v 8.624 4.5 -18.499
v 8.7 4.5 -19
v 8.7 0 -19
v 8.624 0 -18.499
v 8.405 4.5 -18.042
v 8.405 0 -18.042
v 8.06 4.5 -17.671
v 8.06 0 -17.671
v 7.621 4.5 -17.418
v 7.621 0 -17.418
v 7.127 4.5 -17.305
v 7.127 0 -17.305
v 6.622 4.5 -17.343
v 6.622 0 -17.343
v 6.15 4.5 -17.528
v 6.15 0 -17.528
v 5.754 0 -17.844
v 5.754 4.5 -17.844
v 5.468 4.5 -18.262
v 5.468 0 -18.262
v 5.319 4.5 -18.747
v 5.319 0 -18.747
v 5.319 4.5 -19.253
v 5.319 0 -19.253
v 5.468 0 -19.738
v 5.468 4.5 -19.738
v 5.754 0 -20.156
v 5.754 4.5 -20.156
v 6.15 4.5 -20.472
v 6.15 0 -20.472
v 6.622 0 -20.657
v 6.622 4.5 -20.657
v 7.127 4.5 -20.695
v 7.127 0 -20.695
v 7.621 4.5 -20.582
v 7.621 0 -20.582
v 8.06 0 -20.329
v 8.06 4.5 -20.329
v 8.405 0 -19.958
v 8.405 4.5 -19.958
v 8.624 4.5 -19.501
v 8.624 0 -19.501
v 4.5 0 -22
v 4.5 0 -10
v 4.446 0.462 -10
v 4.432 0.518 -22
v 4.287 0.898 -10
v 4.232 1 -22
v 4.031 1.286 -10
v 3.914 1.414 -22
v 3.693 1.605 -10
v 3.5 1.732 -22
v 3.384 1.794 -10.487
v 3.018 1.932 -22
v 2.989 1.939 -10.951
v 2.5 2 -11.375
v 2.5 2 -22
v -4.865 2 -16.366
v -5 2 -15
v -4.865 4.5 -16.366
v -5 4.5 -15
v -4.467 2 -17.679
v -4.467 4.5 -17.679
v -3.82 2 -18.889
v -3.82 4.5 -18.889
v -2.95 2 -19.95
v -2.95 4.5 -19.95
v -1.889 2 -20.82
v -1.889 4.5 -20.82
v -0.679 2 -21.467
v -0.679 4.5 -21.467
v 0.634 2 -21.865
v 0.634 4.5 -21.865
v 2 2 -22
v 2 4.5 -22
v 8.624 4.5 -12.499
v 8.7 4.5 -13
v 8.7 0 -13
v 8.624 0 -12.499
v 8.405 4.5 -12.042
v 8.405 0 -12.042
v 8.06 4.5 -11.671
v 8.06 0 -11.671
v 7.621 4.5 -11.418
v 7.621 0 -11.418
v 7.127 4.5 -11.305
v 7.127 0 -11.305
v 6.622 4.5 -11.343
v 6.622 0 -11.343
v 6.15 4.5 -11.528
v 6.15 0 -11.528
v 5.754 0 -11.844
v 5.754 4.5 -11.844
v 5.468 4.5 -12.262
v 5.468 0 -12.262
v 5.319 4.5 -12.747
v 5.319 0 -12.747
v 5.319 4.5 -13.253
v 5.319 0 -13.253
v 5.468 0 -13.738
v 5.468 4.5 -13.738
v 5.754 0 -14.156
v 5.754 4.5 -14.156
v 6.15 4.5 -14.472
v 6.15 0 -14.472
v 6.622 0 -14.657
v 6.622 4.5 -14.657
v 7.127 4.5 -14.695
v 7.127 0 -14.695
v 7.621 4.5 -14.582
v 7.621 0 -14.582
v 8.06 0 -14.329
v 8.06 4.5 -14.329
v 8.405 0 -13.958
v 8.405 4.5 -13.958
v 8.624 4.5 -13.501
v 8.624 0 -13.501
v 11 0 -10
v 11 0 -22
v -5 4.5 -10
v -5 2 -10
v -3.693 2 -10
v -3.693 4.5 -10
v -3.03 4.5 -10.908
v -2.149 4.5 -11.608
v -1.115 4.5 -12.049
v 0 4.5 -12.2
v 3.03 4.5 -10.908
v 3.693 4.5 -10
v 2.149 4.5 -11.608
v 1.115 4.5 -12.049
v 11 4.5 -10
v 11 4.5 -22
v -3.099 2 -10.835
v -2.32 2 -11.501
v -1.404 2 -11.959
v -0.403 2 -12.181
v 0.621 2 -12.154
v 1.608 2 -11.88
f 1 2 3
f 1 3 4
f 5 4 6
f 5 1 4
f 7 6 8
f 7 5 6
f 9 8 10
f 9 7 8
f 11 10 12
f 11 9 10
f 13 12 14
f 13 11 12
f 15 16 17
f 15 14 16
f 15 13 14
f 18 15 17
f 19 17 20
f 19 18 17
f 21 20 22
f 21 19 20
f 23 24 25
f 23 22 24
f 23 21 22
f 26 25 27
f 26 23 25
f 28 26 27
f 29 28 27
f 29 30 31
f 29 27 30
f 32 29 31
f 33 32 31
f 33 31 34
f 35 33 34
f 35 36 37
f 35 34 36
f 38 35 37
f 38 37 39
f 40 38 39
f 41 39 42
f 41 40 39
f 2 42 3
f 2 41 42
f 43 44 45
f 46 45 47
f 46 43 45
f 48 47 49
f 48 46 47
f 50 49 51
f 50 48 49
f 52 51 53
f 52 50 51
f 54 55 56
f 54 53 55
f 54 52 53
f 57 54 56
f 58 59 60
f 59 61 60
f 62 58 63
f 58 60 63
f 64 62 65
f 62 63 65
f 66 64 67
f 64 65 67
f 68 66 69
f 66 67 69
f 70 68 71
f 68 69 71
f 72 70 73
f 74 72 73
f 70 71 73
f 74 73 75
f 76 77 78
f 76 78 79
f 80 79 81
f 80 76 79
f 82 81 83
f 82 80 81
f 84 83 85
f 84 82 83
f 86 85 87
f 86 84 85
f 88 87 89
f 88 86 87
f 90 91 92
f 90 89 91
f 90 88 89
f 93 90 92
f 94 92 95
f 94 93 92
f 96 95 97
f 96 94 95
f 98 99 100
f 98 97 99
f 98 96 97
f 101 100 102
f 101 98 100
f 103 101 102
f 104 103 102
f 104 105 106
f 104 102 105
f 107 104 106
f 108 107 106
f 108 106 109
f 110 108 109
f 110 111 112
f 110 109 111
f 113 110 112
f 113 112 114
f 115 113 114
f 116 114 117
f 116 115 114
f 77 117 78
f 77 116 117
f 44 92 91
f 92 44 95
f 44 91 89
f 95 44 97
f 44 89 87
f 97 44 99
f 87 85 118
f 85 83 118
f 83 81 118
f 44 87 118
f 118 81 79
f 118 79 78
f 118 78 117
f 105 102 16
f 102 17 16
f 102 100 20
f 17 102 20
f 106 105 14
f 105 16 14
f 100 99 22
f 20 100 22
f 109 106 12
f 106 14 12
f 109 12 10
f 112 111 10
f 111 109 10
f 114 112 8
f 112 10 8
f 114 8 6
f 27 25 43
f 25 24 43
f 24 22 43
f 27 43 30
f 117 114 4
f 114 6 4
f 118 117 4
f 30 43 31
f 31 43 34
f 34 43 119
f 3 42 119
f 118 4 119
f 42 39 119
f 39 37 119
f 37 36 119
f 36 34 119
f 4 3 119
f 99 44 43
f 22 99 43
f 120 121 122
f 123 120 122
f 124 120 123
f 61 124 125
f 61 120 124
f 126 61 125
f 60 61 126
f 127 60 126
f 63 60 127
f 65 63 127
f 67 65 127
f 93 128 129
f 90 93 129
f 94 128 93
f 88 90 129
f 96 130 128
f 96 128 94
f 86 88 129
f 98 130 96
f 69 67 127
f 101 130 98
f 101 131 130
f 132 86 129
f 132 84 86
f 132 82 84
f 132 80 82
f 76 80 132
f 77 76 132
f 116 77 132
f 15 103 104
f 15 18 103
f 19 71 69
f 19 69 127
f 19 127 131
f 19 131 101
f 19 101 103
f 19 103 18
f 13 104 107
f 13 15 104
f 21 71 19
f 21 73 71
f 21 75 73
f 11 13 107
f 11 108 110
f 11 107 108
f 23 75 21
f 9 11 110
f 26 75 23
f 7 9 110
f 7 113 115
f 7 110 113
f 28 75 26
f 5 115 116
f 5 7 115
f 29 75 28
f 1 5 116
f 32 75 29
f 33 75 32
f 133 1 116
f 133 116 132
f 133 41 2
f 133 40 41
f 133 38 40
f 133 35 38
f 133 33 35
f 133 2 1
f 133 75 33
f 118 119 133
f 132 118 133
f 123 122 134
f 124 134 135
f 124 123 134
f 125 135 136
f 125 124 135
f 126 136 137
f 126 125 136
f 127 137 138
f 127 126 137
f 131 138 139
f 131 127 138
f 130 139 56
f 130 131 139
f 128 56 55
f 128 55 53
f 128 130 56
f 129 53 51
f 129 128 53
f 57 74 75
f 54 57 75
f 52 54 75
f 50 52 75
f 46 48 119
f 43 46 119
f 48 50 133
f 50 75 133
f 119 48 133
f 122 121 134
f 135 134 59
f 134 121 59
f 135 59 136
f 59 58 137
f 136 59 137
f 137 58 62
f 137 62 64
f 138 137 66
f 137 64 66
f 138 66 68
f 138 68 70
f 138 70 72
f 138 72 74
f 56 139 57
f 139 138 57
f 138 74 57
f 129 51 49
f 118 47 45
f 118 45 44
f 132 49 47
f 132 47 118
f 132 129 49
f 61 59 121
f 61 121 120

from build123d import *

# Parameters (mm, degrees)
CYLINDER219_R          = 1.7
CYLINDER219_DEPTH      = 20
CYLINDER219_ROLL_ANGLE = 90
CYLINDER218_R          = 1.7
CYLINDER218_DEPTH      = 20
CYLINDER218_ROLL_ANGLE = 90
CYLINDER217_R          = 4.2
CYLINDER217_DEPTH      = 18
CYLINDER217_ROLL_ANGLE = 90
BOX001027045165_W      = 10
BOX001027045165_H      = 4
BOX001027045165_DEPTH  = 60
CYLINDER216_R          = 2
CYLINDER216_DEPTH      = 74
BOX001027045155_W      = 16
BOX001027045155_H      = 4.5
BOX001027045155_DEPTH  = 12
FILLET032_R            = 7


with BuildPart() as cylinder258:
    # Cylinder219 → Cylinder219 (new body)
    with BuildSketch(Plane.XY):
        Circle(CYLINDER219_R)
    extrude(amount=CYLINDER219_DEPTH)


with BuildPart() as cylinder258_1:
    # Cylinder219 roll: moved
    add(cylinder258.part.rotate(Axis((0, 0, 0), (1, 0, 0)), CYLINDER219_ROLL_ANGLE))


with BuildPart() as cylinder258_2:
    # Cylinder219 placement: moved
    add(cylinder258_1.part.moved(Location((7, 11, -13))))


with BuildPart() as top_slot_m3_clearance:
    # Cylinder218 → Cylinder218 (new body)
    with BuildSketch(Plane.XY):
        Circle(CYLINDER218_R)
    extrude(amount=CYLINDER218_DEPTH)


with BuildPart() as top_slot_m3_clearance_1:
    # Cylinder218 roll: moved
    add(top_slot_m3_clearance.part.rotate(Axis((0, 0, 0), (1, 0, 0)), CYLINDER218_ROLL_ANGLE))


with BuildPart() as top_slot_m3_clearance_2:
    # Cylinder218 placement: moved
    add(top_slot_m3_clearance_1.part.moved(Location((7, 11, -19))))

    # Fusion112117: union Cylinder258
    add(cylinder258_2.part)


with BuildPart() as rocker_cut002:
    # Cylinder217 → Cylinder217 (new body)
    with BuildSketch(Plane.XY):
        Circle(CYLINDER217_R)
    extrude(amount=CYLINDER217_DEPTH)


with BuildPart() as rocker_cut002_1:
    # Cylinder217 roll: moved
    add(rocker_cut002.part.rotate(Axis((0, 0, 0), (1, 0, 0)), CYLINDER217_ROLL_ANGLE))


with BuildPart() as rocker_cut002_2:
    # Cylinder217 placement: moved
    add(rocker_cut002_1.part.moved(Location((0, 9, -8))))


with BuildPart() as cube213:
    # Box001027045165 → Box001027045165 (new body)
    with BuildSketch(Plane(origin=(-10, -2, -57), x_dir=(1, 0, 0), z_dir=(0, 0, 1))):
        with Locations((5, 2)):
            Rectangle(BOX001027045165_W, BOX001027045165_H)
    extrude(amount=BOX001027045165_DEPTH)


with BuildPart() as fusion112116:
    # Cylinder216 → Cylinder216 (new body)
    with BuildSketch(Plane.XY.offset(-62)):
        Circle(CYLINDER216_R)
    extrude(amount=CYLINDER216_DEPTH)

    # Fusion112116: union Cube213
    add(cube213.part)


with BuildPart() as fusion112116_1:
    # Fusion112116 placement: moved
    add(fusion112116.part.moved(Location((2.5, 0, 0))))


with BuildPart() as top_slot_plate:
    # Box001027045155 → Box001027045155 (new body)
    with BuildSketch(Plane(origin=(-5, 0, -22), x_dir=(1, 0, 0), z_dir=(0, 0, 1))):
        with Locations((8, 2.25)):
            Rectangle(BOX001027045155_W, BOX001027045155_H)
    extrude(amount=BOX001027045155_DEPTH)

    # Cut196: cut Fusion112116
    add(fusion112116_1.part, mode=Mode.SUBTRACT)

    # Cut197: cut rocker-cut002
    add(rocker_cut002_2.part, mode=Mode.SUBTRACT)

    # Cut198: cut top-slot-m3-clearance
    add(top_slot_m3_clearance_2.part, mode=Mode.SUBTRACT)

    # Fillet032
    fillet032_edges = [top_slot_plate.edges().sort_by_distance(p)[0] for p in [
        (-5, 3.25, -22),
    ]]
    fillet(fillet032_edges, radius=FILLET032_R)


solid = top_slot_plate.part
